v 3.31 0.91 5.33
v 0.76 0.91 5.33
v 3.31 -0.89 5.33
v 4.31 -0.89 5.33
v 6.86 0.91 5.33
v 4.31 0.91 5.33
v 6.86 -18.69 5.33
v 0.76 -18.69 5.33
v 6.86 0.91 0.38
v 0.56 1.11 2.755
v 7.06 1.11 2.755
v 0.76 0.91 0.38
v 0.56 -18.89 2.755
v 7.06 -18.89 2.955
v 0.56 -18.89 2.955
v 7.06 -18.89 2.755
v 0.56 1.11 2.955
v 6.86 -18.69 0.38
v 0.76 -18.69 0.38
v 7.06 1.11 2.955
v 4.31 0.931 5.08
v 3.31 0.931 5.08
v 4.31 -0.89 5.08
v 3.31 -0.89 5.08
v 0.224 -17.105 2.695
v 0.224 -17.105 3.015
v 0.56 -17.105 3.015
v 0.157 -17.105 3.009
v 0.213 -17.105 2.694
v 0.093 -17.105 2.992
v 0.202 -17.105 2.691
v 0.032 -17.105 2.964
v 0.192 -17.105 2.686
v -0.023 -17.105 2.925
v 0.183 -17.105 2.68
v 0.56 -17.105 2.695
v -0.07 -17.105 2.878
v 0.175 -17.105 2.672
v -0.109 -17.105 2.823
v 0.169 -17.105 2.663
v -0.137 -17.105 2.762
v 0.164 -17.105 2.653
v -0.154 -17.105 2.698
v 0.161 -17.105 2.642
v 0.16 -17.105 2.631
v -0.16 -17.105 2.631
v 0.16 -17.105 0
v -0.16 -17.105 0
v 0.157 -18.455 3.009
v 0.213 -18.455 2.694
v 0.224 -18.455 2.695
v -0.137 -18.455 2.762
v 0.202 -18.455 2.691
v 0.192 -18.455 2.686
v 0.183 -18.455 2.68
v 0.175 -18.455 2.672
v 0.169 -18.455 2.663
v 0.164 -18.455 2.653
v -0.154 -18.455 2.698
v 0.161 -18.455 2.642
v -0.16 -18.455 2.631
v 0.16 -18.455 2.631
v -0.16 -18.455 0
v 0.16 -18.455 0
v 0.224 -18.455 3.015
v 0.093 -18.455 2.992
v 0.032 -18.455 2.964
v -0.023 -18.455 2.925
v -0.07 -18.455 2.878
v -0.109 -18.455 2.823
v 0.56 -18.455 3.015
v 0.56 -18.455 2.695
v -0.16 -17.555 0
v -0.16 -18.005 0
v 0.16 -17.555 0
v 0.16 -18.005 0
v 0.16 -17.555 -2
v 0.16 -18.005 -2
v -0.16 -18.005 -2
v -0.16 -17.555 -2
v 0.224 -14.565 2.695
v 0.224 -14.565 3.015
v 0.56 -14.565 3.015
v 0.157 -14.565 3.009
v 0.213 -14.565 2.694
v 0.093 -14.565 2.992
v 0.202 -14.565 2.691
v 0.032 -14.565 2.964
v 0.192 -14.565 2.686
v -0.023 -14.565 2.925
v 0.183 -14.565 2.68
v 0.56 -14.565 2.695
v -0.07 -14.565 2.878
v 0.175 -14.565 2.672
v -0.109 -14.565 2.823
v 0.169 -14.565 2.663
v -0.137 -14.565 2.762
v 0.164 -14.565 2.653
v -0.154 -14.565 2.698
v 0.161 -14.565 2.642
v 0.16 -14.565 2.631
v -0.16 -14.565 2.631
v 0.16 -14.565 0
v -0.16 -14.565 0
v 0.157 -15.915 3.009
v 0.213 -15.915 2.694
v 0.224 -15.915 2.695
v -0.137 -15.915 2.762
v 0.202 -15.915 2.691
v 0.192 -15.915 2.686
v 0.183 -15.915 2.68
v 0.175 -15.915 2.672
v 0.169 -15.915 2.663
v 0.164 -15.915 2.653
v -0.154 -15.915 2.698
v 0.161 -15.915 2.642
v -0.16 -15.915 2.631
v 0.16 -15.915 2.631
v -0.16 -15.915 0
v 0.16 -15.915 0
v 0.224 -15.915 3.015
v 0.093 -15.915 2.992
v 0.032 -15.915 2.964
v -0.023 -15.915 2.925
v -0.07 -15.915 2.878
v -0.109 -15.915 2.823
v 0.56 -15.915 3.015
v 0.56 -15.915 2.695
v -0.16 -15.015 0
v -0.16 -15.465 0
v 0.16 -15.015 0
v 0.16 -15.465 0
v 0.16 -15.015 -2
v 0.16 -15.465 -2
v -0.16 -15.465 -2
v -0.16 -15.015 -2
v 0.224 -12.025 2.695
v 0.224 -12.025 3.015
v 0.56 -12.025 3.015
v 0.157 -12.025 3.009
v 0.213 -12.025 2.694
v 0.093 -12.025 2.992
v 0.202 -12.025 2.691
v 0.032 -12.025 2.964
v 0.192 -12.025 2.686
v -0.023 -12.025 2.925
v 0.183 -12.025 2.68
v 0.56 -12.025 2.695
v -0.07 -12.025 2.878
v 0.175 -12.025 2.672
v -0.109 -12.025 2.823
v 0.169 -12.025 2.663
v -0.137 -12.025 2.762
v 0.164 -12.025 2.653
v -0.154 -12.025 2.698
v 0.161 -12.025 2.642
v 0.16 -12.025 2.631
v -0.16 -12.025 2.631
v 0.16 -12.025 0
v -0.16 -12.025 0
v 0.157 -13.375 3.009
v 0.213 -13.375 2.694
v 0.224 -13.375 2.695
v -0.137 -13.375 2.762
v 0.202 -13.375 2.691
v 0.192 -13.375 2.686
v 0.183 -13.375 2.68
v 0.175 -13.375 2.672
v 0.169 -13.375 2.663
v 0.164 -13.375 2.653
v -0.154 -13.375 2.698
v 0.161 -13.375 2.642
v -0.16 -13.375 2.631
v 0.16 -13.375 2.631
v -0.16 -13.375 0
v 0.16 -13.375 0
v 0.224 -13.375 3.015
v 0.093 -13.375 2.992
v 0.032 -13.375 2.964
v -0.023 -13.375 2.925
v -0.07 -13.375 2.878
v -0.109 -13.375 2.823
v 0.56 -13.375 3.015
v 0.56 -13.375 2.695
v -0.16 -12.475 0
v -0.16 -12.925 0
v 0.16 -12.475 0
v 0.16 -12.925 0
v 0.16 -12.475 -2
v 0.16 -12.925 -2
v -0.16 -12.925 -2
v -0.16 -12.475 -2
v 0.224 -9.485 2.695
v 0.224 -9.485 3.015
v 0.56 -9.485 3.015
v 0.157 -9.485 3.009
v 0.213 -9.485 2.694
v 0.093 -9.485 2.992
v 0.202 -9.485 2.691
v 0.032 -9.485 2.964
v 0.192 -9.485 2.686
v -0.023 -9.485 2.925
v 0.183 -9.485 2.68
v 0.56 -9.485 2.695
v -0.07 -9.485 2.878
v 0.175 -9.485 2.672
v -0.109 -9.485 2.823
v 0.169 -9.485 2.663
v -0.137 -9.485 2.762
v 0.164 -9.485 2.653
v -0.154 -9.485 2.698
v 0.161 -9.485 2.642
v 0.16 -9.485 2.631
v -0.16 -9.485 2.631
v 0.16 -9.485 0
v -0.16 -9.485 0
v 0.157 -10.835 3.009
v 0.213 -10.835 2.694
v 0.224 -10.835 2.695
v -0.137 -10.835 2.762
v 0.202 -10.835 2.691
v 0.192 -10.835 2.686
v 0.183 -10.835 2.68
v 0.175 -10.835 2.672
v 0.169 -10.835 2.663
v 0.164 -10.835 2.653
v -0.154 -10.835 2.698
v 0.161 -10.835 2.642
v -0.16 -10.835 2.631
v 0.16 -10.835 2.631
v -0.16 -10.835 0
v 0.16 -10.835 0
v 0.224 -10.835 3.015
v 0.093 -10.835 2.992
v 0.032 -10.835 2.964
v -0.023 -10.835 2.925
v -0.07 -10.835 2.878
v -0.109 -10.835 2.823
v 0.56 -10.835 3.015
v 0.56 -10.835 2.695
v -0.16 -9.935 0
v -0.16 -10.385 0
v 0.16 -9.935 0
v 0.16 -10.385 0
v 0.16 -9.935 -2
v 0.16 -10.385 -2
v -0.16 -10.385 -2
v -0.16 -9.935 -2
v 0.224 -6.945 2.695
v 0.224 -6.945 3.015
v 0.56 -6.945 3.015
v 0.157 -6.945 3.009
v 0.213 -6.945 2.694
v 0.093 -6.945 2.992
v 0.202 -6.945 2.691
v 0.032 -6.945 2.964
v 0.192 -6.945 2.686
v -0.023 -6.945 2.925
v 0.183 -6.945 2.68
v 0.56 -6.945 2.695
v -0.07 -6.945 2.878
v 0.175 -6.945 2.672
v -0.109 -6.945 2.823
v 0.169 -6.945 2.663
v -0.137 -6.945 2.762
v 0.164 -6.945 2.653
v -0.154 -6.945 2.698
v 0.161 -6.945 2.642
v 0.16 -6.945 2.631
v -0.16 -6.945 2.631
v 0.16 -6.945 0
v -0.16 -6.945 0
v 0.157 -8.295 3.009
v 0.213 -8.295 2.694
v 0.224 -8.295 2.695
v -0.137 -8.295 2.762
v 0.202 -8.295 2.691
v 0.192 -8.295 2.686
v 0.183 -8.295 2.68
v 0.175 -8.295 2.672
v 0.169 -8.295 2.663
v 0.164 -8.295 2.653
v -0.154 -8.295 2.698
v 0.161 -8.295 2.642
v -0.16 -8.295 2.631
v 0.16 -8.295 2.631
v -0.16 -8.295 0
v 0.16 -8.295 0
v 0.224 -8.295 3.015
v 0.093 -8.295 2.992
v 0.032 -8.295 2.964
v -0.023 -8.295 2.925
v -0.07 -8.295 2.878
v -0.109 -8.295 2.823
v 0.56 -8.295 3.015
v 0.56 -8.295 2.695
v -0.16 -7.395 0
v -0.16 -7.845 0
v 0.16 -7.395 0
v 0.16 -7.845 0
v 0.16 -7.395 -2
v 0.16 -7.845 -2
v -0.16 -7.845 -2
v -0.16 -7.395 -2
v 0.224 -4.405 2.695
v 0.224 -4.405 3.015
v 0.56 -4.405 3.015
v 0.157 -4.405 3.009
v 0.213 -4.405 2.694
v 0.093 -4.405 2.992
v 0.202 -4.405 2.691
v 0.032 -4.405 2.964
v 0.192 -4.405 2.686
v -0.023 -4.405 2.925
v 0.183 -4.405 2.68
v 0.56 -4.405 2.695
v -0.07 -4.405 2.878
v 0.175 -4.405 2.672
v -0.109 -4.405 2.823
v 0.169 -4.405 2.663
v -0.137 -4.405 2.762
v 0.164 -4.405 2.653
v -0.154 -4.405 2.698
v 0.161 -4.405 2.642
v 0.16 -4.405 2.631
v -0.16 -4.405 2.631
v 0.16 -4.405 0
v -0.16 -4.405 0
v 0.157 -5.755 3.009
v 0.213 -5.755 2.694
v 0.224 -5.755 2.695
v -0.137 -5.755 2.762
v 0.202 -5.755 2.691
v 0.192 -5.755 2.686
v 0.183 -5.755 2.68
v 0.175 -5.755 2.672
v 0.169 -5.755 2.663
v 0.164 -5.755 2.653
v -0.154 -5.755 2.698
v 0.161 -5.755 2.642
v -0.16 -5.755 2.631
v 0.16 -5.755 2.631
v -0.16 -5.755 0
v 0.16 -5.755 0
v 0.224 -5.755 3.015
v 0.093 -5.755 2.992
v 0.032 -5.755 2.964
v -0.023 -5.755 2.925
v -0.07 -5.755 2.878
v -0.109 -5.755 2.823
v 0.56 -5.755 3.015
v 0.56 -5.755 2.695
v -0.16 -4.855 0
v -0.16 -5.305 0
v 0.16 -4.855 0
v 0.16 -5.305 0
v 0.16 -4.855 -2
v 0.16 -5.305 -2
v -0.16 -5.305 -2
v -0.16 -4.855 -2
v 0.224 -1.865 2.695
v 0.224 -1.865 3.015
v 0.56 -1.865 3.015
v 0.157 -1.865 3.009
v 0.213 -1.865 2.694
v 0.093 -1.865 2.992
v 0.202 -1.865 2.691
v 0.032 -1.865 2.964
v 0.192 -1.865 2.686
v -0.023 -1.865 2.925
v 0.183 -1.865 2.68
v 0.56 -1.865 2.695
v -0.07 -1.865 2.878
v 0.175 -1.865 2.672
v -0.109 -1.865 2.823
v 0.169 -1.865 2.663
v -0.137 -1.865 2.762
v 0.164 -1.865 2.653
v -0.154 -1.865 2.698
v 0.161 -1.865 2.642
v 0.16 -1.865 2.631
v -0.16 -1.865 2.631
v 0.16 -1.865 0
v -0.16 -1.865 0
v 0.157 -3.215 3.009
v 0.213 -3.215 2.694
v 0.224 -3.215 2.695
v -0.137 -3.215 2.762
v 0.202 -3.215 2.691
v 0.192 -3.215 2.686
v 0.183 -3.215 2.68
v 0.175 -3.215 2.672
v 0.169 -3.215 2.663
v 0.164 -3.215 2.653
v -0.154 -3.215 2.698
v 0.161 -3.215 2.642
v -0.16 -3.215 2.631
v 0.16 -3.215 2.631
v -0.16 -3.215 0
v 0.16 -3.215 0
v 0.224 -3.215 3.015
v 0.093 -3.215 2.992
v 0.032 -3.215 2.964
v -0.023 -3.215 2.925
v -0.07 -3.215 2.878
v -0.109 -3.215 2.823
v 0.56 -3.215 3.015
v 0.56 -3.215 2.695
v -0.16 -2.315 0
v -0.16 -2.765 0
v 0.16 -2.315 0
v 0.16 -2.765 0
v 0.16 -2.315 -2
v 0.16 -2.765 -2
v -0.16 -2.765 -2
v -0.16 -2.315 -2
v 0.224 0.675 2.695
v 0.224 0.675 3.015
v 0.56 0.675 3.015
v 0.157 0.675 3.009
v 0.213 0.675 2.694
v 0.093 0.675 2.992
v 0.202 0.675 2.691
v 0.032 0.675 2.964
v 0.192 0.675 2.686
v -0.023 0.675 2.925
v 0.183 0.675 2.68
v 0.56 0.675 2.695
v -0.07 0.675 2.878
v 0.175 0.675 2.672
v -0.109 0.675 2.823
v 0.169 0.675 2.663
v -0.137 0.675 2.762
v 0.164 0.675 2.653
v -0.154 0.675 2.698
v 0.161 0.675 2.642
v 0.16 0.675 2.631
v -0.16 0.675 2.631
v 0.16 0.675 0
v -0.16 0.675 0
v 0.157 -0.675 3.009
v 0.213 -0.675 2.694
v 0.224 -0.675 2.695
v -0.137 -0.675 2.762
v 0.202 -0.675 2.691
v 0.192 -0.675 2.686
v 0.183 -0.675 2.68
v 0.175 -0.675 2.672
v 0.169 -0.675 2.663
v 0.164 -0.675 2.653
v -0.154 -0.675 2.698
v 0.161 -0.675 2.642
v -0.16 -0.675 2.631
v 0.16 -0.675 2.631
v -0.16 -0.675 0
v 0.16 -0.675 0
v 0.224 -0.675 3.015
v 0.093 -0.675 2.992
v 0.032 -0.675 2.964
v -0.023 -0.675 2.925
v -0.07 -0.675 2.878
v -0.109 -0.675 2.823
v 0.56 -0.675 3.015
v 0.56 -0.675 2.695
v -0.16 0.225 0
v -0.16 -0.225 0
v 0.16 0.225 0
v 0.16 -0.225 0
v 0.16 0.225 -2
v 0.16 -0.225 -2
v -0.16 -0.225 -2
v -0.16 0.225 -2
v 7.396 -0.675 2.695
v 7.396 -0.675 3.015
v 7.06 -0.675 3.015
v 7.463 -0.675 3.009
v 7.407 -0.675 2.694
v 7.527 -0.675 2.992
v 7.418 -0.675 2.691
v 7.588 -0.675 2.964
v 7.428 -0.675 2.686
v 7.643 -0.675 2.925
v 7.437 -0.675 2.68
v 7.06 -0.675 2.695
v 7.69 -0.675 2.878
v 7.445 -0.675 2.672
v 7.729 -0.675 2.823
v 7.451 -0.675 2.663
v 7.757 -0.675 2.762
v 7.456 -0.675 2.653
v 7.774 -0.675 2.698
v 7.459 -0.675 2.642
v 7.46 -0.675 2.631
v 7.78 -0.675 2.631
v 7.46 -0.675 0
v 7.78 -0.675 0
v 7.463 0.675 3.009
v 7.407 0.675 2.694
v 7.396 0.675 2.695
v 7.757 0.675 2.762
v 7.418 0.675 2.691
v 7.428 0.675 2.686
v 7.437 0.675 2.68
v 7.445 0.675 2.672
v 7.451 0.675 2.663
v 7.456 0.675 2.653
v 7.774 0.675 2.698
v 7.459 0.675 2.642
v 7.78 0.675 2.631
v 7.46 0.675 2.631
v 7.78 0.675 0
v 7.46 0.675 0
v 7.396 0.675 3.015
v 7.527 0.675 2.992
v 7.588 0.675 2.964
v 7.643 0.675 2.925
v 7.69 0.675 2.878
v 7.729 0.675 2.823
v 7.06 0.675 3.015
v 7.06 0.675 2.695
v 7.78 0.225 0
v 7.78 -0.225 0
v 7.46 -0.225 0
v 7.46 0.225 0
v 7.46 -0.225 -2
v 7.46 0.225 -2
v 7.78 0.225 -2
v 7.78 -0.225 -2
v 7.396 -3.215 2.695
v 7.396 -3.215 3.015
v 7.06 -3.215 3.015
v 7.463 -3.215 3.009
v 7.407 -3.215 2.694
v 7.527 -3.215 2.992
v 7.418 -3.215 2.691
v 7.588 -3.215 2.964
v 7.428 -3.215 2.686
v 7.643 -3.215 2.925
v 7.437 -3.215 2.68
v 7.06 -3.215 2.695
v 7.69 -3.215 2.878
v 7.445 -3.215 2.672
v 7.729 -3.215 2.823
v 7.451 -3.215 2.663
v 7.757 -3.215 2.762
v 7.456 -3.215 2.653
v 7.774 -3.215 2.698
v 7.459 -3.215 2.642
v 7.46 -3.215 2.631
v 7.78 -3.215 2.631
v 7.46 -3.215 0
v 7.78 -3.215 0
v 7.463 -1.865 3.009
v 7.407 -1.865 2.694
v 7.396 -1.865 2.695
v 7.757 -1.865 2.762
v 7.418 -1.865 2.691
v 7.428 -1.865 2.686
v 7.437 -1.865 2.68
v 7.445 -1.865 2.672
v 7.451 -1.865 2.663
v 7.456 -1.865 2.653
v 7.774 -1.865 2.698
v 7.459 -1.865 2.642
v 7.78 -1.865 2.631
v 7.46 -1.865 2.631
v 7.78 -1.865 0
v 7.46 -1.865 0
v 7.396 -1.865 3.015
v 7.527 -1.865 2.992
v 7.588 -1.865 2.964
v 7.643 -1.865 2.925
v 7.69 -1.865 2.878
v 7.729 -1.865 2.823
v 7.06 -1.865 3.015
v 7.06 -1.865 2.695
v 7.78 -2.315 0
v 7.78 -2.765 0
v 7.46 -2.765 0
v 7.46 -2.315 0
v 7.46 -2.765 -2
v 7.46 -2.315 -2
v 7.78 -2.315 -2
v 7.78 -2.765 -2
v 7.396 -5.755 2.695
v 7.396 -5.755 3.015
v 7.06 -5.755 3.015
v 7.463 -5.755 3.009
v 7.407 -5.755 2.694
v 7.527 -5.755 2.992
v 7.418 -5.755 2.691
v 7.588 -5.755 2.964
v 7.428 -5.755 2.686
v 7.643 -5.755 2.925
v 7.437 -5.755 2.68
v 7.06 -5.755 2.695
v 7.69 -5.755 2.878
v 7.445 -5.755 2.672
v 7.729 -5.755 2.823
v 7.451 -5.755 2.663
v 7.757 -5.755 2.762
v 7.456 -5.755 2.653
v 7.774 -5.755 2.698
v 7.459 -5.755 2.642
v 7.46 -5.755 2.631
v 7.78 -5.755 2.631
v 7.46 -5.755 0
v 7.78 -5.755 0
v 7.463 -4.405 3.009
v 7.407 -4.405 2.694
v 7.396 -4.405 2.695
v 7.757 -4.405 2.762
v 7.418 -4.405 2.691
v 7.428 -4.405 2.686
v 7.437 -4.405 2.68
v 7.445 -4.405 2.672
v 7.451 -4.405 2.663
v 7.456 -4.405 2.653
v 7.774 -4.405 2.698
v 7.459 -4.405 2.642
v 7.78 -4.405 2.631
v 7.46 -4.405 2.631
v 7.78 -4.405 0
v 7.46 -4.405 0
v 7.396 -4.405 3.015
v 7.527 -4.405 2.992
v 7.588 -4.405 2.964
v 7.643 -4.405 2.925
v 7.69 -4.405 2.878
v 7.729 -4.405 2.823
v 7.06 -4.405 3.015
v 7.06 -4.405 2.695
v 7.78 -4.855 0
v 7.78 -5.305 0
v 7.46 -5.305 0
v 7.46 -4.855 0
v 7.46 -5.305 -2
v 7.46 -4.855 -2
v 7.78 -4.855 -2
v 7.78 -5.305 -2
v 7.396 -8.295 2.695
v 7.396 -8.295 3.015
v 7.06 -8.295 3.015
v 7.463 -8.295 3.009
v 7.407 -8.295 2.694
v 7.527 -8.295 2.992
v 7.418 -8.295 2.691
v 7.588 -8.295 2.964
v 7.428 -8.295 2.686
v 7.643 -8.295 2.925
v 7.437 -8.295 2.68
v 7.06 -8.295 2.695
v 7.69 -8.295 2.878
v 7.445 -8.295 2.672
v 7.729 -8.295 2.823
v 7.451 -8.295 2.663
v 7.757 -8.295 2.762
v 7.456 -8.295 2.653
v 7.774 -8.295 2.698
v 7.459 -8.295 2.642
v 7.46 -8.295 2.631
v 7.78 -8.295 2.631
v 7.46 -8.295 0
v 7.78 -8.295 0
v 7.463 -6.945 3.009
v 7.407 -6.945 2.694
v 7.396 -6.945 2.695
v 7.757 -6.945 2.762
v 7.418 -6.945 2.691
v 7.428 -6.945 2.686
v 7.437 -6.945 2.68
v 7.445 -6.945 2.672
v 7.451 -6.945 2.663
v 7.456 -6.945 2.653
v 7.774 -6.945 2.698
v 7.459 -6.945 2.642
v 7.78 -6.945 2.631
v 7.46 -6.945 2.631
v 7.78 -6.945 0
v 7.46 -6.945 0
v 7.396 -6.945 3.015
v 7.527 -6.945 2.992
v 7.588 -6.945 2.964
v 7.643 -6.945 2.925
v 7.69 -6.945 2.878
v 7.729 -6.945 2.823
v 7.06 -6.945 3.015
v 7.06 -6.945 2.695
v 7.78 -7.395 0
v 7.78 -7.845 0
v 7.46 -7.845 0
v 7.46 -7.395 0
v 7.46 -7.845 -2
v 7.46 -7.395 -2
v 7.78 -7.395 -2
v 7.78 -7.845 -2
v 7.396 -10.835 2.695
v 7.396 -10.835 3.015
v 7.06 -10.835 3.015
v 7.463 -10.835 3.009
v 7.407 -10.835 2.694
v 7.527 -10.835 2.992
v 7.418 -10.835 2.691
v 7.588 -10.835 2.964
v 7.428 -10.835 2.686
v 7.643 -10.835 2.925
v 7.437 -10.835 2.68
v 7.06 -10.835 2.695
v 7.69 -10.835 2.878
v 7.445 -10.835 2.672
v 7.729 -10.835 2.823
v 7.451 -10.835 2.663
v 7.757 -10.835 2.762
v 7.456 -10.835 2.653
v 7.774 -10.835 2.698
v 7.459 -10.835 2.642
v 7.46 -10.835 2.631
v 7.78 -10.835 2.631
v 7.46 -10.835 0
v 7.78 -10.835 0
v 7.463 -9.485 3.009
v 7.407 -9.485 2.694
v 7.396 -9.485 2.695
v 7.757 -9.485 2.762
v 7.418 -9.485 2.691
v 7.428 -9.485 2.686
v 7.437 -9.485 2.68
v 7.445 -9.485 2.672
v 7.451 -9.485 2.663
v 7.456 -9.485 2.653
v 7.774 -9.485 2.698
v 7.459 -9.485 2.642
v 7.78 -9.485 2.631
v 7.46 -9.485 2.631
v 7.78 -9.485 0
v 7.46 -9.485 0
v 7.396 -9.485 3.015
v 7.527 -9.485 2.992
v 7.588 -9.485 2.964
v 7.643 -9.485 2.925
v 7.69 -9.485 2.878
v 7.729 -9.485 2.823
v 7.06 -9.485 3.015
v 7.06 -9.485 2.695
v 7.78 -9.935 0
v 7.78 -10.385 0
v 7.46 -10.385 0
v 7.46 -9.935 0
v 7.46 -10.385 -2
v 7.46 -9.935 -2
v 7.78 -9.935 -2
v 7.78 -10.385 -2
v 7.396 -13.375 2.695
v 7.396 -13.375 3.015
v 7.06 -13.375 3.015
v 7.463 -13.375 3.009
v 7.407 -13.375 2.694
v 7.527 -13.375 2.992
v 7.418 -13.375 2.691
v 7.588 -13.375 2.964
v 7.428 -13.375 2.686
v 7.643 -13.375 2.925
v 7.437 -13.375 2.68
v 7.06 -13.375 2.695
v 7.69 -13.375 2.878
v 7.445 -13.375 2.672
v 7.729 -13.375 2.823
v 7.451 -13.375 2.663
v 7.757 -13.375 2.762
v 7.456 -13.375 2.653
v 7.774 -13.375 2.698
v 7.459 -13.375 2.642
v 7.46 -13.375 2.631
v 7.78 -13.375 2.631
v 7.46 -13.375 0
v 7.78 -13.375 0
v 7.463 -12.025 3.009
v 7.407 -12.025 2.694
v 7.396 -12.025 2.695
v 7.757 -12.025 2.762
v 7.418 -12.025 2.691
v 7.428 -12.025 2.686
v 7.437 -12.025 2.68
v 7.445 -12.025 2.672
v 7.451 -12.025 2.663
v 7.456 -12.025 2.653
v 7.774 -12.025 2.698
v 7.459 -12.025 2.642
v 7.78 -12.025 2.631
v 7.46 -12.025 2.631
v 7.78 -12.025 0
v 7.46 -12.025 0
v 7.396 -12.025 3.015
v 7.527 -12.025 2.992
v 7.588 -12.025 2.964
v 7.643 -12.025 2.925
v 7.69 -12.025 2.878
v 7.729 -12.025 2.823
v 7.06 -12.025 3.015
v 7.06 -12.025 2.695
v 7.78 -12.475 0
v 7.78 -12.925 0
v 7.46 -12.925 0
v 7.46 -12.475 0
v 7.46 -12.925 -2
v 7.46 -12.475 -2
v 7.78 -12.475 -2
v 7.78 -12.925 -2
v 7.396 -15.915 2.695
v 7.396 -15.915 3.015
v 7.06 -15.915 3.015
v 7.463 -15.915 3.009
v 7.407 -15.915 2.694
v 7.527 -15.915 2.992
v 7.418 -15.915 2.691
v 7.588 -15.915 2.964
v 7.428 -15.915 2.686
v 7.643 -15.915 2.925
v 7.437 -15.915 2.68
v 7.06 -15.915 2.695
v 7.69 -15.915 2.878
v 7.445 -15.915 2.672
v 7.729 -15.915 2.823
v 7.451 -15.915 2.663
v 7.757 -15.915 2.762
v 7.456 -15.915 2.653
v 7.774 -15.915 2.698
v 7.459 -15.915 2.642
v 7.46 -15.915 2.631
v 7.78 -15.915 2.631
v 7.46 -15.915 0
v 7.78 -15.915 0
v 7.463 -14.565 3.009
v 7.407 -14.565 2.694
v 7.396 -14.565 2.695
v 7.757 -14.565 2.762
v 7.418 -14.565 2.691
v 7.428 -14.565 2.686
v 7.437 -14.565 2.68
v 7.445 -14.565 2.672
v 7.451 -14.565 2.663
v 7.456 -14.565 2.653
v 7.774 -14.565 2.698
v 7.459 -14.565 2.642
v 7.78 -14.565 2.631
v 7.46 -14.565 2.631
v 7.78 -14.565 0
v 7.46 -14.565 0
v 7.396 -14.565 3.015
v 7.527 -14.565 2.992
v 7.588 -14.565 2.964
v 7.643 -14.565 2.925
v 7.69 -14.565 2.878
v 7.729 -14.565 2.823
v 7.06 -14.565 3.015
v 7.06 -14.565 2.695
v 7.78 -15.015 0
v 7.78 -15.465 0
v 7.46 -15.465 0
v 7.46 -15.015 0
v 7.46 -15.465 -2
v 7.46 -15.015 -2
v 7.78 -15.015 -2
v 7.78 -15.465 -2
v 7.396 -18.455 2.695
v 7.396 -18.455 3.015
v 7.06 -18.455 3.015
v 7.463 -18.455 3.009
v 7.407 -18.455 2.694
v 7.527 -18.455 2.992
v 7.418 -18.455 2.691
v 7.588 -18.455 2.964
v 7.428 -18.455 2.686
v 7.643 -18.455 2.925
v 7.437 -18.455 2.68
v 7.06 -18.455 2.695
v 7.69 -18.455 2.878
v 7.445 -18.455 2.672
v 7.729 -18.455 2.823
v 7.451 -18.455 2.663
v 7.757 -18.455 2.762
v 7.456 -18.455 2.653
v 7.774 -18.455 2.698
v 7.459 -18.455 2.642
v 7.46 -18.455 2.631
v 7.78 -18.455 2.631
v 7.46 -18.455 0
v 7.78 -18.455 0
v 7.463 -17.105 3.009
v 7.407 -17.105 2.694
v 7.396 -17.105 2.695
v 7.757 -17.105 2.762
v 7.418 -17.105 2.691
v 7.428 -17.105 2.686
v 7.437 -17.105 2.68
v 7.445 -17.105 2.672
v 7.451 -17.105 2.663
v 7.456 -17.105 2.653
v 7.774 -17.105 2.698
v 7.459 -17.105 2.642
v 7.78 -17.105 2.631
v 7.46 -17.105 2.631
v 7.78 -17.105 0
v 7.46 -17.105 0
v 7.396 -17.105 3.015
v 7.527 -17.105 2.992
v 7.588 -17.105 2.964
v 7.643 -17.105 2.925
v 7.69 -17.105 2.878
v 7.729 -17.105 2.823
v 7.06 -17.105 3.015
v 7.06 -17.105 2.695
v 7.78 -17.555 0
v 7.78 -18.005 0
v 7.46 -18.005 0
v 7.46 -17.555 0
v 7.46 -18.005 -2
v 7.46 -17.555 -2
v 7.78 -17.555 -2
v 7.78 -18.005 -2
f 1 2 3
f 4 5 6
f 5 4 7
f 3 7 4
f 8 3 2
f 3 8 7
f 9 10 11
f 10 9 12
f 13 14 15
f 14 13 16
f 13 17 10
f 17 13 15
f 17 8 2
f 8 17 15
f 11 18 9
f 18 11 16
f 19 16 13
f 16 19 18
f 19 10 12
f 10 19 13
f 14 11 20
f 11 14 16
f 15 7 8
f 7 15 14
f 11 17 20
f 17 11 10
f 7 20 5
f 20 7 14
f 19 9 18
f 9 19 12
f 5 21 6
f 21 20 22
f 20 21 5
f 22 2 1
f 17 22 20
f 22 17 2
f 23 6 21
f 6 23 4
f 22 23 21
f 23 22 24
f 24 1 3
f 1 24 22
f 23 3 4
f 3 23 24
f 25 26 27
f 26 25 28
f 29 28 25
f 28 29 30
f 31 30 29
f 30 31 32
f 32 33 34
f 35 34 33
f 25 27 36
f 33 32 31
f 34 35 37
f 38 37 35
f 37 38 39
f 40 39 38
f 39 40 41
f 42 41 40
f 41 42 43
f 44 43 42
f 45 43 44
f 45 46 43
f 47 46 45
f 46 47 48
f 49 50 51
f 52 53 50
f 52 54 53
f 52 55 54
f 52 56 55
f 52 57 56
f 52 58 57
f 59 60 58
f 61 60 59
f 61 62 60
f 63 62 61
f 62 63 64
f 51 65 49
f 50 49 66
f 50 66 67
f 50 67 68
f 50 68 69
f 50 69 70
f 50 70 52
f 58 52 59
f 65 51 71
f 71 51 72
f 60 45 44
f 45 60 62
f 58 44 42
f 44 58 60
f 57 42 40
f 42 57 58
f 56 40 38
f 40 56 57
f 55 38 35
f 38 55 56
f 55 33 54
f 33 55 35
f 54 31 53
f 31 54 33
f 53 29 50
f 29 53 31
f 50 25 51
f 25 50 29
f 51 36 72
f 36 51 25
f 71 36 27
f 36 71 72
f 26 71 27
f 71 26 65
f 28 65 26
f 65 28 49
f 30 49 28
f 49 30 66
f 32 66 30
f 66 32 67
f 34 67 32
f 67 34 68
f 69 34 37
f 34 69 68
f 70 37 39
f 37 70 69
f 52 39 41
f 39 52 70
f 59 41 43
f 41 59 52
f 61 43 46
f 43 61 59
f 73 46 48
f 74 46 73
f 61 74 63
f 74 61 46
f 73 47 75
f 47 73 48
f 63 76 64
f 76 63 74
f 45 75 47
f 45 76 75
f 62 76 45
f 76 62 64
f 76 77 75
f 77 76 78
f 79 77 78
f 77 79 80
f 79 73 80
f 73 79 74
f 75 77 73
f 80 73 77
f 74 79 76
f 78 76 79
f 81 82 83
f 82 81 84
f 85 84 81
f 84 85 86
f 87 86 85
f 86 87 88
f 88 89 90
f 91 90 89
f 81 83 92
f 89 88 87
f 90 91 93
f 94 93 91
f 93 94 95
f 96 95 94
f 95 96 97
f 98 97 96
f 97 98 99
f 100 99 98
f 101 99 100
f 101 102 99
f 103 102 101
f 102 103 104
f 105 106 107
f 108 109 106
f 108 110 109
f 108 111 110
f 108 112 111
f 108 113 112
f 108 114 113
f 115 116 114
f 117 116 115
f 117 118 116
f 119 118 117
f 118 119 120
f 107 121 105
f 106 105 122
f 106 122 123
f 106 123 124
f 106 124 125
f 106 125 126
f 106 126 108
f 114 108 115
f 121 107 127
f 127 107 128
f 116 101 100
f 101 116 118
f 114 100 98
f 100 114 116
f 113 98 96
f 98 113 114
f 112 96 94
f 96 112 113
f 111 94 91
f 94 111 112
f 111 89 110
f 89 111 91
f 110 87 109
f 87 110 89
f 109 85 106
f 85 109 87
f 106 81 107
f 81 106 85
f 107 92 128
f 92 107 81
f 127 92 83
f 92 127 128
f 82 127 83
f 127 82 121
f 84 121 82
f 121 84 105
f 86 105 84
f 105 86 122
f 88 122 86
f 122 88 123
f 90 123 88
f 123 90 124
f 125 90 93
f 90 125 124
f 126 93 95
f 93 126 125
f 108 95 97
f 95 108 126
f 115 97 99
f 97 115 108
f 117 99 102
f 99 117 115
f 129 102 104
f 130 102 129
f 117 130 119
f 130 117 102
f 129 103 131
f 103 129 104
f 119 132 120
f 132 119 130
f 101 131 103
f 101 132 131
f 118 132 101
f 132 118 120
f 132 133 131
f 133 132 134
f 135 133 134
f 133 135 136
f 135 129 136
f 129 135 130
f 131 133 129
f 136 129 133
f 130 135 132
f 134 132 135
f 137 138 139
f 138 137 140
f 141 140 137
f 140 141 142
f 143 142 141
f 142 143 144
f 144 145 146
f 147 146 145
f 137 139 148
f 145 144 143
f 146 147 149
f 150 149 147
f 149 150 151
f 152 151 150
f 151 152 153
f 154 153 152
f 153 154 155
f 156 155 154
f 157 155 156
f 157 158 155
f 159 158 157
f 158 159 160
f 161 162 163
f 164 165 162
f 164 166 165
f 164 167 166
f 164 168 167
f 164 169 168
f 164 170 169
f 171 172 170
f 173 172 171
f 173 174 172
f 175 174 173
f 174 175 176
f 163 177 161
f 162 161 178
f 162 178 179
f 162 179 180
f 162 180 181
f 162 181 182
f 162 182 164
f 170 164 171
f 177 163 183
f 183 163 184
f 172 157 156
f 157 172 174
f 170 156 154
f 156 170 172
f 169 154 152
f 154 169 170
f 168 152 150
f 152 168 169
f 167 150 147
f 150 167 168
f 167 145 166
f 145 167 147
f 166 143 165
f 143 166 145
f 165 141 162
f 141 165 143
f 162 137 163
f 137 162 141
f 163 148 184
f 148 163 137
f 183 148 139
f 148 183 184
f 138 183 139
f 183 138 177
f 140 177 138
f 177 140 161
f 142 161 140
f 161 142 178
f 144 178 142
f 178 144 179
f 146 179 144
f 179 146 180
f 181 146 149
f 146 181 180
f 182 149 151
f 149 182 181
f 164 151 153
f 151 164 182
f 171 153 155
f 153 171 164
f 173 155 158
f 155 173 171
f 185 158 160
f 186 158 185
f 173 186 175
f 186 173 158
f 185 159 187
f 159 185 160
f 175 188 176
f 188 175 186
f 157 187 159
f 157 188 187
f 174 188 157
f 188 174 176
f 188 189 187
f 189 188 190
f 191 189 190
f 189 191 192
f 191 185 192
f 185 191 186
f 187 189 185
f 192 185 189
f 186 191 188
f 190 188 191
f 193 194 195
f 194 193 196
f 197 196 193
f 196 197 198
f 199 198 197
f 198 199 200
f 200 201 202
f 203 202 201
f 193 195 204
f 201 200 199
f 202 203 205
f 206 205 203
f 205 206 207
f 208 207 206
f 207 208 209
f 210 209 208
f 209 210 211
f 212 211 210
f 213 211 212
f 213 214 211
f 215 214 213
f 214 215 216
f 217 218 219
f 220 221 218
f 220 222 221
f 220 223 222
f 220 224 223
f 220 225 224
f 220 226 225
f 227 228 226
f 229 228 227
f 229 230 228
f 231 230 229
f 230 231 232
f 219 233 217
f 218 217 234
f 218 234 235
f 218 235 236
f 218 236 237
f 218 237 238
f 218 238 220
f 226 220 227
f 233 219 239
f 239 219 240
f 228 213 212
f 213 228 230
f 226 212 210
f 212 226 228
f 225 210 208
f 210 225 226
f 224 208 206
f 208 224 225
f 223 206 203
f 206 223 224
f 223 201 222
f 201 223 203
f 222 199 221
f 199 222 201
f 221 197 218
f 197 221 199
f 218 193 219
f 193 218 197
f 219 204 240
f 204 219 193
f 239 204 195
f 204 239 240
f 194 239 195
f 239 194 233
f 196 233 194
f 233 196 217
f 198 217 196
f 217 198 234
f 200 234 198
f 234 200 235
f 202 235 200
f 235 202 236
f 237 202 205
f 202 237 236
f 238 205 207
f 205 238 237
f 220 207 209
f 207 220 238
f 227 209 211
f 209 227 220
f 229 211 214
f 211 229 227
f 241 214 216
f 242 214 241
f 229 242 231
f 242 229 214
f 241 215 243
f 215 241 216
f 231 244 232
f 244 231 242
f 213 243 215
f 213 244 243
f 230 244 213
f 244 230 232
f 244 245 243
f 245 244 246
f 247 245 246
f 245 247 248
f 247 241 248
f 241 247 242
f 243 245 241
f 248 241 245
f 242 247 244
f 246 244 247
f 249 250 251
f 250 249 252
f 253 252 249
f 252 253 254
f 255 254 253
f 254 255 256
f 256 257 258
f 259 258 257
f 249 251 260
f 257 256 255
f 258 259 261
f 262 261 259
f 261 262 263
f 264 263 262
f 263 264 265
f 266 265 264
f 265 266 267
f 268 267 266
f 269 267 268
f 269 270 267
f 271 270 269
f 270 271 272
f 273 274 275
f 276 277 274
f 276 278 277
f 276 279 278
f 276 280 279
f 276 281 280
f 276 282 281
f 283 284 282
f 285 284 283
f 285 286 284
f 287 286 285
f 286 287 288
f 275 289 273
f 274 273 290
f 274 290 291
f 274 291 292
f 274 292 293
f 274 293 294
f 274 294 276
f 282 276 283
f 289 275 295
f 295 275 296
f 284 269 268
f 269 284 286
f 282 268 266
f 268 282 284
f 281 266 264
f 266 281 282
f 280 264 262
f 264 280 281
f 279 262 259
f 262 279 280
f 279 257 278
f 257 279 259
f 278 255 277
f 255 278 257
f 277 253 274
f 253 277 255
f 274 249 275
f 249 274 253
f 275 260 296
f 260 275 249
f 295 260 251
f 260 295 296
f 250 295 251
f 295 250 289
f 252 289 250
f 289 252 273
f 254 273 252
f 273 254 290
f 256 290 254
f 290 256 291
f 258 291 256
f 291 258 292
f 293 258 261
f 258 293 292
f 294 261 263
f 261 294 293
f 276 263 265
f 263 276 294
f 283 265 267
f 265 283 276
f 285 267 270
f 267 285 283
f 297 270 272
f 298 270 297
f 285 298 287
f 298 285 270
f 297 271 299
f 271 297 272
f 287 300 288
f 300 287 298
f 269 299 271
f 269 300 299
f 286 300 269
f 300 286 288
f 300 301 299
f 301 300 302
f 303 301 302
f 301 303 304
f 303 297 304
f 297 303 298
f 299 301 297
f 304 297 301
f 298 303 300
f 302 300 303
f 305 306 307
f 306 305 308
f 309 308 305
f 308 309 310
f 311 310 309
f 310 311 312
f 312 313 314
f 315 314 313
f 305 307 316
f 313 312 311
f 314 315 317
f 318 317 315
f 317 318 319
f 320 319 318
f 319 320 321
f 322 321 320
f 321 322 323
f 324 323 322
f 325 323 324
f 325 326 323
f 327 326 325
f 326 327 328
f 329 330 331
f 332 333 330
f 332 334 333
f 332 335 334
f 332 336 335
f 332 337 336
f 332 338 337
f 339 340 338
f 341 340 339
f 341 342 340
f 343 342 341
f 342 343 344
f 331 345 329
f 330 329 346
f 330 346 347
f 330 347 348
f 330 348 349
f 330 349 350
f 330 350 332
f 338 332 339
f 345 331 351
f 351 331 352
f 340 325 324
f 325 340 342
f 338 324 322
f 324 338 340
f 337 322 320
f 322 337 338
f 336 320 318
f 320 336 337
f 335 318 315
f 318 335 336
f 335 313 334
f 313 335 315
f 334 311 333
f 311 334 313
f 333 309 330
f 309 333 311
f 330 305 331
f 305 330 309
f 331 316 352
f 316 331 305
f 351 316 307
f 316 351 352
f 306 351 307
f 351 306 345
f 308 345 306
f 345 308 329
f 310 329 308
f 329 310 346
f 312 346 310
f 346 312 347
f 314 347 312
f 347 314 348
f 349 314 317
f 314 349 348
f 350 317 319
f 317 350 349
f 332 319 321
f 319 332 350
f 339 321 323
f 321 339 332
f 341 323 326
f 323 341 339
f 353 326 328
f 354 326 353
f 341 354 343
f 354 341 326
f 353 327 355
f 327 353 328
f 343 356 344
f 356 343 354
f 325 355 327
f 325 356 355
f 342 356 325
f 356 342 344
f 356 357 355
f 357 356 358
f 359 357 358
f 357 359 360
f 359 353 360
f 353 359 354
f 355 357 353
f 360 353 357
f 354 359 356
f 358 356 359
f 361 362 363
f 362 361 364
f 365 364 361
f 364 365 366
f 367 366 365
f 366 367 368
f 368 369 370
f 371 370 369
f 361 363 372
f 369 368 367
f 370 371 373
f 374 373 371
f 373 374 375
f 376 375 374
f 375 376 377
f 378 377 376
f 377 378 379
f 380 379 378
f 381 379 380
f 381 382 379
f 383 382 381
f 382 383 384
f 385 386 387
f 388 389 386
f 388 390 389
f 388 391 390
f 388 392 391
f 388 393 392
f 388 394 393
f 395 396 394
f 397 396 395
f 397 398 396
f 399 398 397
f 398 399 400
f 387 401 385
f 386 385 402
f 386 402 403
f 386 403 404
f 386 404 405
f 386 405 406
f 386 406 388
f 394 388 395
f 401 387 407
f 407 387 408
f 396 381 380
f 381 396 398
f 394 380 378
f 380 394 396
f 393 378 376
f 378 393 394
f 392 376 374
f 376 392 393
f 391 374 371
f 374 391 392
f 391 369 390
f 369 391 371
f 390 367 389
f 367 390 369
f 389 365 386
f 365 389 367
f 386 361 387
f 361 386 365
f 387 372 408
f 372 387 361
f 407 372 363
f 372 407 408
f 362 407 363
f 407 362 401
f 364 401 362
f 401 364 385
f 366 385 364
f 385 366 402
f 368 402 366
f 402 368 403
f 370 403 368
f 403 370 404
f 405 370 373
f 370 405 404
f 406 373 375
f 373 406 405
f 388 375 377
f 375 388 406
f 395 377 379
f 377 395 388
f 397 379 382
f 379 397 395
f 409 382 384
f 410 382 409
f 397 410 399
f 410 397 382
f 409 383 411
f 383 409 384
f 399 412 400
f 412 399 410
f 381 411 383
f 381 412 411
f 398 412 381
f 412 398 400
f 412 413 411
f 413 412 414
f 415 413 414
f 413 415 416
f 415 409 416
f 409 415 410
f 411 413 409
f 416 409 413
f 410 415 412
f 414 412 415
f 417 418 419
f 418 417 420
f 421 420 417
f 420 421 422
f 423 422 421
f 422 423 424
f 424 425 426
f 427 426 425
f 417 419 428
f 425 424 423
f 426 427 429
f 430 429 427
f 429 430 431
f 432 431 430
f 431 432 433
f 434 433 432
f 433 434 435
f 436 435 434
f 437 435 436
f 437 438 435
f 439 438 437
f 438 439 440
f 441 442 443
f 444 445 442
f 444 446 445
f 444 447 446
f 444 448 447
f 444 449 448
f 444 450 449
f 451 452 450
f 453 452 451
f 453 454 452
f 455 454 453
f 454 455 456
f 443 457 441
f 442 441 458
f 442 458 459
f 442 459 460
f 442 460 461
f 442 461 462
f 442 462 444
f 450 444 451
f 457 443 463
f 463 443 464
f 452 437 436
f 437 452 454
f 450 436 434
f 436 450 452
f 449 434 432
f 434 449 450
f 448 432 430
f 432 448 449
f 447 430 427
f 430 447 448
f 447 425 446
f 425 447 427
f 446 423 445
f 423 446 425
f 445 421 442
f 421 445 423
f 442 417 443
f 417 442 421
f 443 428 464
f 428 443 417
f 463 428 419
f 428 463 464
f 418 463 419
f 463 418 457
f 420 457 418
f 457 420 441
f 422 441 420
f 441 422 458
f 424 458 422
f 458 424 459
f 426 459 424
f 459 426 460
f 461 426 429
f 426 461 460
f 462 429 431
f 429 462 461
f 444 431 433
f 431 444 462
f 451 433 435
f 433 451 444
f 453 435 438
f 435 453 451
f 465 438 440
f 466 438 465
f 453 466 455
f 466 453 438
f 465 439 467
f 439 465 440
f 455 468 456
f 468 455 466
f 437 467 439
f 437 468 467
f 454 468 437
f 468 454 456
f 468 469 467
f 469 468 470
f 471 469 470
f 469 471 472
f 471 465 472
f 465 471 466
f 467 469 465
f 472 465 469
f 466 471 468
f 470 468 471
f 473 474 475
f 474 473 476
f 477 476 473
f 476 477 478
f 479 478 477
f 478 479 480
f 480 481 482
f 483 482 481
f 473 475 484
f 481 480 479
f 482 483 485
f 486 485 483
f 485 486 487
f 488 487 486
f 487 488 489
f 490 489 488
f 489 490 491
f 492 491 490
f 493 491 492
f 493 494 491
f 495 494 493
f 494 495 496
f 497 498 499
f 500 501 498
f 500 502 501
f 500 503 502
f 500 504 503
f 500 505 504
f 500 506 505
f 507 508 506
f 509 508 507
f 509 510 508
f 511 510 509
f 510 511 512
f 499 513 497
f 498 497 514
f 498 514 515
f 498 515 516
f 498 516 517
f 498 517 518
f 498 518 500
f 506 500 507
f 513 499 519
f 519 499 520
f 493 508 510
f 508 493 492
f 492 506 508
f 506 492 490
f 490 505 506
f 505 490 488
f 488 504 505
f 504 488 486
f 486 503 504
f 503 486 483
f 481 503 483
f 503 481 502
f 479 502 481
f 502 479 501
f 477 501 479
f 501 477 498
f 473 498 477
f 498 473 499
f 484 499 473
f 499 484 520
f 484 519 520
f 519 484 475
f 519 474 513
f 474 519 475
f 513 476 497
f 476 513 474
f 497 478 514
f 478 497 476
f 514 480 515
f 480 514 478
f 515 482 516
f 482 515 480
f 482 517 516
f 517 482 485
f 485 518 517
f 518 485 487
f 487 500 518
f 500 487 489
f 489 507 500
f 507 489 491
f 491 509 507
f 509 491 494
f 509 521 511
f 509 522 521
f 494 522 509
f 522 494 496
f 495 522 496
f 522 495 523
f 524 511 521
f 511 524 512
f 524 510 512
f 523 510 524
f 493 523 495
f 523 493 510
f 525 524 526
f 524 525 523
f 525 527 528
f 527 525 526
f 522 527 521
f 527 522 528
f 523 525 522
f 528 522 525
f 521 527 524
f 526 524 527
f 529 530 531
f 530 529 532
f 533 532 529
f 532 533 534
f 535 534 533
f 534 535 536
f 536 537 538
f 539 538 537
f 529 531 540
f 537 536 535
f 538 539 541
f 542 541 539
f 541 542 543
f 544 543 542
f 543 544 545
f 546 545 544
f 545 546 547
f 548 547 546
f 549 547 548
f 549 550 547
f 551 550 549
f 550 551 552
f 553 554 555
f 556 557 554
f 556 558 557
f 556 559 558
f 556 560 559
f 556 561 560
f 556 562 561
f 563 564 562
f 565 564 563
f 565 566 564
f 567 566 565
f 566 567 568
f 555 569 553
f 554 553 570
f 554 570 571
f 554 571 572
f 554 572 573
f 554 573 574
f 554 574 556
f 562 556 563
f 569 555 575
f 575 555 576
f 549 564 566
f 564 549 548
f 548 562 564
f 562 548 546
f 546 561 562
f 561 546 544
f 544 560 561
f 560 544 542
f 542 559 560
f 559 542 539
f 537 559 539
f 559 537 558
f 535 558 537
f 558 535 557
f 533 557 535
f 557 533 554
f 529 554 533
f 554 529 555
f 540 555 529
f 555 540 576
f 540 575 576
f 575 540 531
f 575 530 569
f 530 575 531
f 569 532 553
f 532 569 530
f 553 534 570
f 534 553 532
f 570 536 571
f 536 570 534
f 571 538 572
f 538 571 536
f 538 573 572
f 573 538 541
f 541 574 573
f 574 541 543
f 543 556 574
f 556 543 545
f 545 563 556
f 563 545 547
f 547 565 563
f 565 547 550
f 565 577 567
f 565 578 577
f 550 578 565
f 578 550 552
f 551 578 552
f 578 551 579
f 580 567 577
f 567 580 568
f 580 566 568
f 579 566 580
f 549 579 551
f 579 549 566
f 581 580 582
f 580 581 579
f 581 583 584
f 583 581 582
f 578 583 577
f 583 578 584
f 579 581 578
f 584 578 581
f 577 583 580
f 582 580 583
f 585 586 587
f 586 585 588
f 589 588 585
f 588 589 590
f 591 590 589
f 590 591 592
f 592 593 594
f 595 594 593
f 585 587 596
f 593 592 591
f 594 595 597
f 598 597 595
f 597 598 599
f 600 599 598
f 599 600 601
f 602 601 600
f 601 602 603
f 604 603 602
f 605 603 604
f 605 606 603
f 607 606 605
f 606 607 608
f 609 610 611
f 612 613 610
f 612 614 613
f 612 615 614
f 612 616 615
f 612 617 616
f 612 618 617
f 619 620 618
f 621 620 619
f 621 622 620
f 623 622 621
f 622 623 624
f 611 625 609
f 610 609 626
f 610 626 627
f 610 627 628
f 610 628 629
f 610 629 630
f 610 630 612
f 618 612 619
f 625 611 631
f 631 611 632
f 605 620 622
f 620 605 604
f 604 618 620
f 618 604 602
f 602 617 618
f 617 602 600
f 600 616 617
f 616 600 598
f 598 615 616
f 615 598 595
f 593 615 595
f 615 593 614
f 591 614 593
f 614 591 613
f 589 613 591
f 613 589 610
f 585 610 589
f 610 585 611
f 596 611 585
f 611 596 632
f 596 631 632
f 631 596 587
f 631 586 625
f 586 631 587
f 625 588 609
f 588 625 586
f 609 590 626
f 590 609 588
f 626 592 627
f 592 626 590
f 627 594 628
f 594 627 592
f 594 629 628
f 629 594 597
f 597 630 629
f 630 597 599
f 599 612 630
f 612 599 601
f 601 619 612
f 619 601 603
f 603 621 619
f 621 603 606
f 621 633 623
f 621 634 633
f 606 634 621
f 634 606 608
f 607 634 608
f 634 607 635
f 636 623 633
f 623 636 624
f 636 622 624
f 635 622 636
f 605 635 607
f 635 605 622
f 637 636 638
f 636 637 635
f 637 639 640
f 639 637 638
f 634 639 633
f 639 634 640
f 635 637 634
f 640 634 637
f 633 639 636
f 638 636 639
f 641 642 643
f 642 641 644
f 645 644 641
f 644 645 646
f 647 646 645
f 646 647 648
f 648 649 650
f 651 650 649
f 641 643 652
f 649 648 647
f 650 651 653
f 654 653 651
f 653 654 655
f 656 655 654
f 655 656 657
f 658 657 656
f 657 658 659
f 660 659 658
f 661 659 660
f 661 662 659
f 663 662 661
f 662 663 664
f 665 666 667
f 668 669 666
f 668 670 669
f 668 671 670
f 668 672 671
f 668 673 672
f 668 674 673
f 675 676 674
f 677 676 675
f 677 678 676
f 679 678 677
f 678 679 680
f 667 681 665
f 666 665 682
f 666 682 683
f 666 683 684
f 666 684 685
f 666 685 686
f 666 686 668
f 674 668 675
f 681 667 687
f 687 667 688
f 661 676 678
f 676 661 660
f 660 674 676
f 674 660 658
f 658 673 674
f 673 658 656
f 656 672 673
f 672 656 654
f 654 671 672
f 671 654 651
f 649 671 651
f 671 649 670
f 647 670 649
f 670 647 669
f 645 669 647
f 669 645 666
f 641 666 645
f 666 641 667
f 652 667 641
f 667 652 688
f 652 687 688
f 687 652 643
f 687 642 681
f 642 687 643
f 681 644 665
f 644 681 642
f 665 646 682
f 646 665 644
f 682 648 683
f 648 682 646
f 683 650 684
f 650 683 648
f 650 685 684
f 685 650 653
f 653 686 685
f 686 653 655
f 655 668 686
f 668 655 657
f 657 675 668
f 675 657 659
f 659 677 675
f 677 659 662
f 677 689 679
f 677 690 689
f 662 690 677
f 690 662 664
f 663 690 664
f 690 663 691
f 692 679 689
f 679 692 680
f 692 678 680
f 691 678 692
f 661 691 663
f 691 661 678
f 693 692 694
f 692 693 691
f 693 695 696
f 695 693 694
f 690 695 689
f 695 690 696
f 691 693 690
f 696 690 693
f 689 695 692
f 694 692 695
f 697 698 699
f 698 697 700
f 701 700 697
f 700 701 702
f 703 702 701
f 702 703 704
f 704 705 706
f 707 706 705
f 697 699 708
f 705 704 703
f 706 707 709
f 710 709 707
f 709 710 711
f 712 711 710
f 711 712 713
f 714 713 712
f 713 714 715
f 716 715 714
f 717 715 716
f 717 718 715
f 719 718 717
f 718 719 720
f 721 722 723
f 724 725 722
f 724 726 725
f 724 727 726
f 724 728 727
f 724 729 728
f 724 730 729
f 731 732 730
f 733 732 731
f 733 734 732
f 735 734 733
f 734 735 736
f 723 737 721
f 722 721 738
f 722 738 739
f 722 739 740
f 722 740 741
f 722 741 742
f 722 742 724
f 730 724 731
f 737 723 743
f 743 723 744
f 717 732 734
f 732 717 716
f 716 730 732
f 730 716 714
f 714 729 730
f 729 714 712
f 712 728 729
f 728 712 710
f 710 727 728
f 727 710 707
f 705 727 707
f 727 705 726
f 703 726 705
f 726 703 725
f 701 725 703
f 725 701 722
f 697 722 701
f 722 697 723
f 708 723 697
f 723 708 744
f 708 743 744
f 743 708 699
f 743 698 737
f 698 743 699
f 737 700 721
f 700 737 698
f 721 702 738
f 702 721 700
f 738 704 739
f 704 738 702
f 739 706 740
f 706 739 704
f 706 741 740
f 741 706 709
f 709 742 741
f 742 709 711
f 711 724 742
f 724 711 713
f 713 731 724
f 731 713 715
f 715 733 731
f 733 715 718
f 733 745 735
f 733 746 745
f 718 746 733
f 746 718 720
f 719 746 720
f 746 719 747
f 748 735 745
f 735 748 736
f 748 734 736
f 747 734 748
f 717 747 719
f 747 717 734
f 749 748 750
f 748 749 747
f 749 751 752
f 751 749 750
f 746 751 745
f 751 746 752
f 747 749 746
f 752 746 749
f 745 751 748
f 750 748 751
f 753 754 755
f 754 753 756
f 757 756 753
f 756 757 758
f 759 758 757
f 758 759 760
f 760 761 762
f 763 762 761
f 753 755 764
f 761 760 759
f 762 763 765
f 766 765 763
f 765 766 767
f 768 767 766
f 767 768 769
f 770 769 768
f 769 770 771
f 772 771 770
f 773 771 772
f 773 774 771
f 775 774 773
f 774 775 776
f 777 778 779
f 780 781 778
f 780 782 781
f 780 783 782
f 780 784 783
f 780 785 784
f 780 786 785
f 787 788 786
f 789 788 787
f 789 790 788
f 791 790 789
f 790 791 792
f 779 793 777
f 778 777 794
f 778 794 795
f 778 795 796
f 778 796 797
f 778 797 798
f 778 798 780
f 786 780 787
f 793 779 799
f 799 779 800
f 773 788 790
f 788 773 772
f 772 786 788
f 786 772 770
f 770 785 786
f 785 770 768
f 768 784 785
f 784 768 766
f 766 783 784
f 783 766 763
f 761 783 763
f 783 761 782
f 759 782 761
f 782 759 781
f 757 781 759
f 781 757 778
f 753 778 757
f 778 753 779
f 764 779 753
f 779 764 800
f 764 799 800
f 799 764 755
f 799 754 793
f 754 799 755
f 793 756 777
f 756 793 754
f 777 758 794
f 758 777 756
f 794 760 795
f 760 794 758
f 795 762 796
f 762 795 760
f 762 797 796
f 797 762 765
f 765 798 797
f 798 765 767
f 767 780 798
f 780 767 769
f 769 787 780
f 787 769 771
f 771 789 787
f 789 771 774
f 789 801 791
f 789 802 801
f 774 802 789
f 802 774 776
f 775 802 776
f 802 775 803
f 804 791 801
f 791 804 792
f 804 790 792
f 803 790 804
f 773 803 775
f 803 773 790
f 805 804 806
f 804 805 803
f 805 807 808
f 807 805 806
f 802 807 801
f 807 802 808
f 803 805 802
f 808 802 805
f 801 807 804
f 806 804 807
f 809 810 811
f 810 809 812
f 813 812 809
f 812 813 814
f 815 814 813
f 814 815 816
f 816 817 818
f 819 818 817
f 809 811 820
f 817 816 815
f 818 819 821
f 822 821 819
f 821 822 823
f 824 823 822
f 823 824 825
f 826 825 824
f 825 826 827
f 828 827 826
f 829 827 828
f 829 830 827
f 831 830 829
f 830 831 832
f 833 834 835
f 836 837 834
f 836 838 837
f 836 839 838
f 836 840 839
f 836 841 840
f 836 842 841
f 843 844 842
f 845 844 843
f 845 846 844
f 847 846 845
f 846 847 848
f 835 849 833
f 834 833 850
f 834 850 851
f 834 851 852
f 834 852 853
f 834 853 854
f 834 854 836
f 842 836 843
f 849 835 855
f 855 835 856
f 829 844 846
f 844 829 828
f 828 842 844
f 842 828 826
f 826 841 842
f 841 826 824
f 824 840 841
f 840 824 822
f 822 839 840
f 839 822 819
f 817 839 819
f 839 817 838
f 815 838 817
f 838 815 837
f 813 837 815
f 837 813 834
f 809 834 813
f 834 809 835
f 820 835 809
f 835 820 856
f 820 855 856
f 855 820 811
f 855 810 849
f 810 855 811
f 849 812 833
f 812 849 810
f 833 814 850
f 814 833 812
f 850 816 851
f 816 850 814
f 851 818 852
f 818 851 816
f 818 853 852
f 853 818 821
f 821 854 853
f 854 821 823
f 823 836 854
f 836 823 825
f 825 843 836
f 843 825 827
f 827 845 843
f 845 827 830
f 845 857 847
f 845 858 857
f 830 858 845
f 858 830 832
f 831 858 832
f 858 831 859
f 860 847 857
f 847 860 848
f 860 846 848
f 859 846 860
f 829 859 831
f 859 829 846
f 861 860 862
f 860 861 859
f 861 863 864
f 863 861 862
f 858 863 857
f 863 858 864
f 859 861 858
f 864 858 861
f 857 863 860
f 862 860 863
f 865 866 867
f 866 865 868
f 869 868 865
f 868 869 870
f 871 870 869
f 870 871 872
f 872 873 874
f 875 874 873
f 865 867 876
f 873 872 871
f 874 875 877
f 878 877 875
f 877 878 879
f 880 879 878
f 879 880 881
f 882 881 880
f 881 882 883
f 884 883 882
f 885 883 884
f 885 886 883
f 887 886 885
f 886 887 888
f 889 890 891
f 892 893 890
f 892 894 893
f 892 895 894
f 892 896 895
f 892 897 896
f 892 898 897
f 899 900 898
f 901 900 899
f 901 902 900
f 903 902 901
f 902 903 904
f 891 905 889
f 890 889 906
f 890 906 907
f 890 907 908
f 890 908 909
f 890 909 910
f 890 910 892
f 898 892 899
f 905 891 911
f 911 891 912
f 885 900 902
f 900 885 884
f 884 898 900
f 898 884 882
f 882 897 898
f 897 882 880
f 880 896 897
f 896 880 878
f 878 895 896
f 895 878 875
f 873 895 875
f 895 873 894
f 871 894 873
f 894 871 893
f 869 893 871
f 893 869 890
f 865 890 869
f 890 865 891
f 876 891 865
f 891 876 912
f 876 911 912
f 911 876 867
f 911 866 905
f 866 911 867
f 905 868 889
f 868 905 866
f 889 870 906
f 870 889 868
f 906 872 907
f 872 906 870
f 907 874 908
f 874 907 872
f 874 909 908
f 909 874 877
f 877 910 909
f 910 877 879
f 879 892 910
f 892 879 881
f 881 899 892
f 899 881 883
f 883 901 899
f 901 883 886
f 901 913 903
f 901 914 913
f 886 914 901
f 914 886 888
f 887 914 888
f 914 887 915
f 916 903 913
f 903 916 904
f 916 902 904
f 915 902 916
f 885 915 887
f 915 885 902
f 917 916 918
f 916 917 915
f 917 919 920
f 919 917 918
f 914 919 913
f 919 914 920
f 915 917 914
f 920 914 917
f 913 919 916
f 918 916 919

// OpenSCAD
// file: proto/dip.scad
/*
OpenSCAD Model:  DIP package

Parameters:
  N  - Number of pins
  P  - Pitch
  TC - Width
  W  - Width of pin
  T  - Thickness of pin
  A  - Body length
  B  - Body width
  H  - Body height
  K  - Elevation
  h  - Pin length
  pincolor - color of pin
  bodycolor - color of plastic body
  simple - 0 = realistic model, 1 = simplified model
*/

module dip(
	N=14,
	P=2.54,
	TC=7.62,
	W=0.45,
	H=5.33,
	T=0.375,
	A=6.35,
	B=19.2,
	K=0.38,
	h=2.0,
	pincolor=[0.9,0.9,0.9],
	bodycolor=[0.2,0.2,0.2],
	simple=0
) {

	module dippinblock()	{
		q=[0,0.173648178,0.342020143,0.5,0.64278761,0.766044443,0.866025404,0.939692621,0.984807753,1];

		x=0.01;
		t2=T/2;
		hk=(H-K)/2+K;
		dt=1.2*T;
		dt2=dt-T;
		cx=dt-t2;
		cy= hk+t2-dt;
		color(pincolor) for (i=[0:(N/2)-1]) {
			 union () {
					translate ([0,-((N/2)-1)/2*P+i*P+1.5*W,0]) rotate(90,[1,0,0]) linear_extrude(height=3*W) {
					if (simple) {
						polygon([
							[-t2,0], [-t2, hk+t2-dt], 	[dt-t2,hk+t2], [(TC-A)/2,hk+t2],[(TC-A)/2,hk-t2], [dt-t2,hk-t2], [t2,hk+t2-dt], [t2,0]]
						);
					} else {
						 polygon([
							[-t2,0],
							[cx-dt*q[9],dt*q[0]+cy],[cx-dt*q[8],dt*q[1]+cy],[cx-dt*q[7],dt*q[2]+cy],[cx-dt*q[6],dt*q[3]+cy],[cx-dt*q[5],dt*q[4]+cy],
							[cx-dt*q[4],dt*q[5]+cy],[cx-dt*q[3],dt*q[6]+cy],[cx-dt*q[2],dt*q[7]+cy],[cx-dt*q[1],dt*q[8]+cy],[cx-dt*q[0],dt*q[9]+cy],
							[dt-t2,hk+t2],
							[(TC-A)/2,hk+t2],[(TC-A)/2,hk-t2],
							[cx-dt2*q[0],dt2*q[9]+cy],[cx-dt2*q[1],dt2*q[8]+cy],[cx-dt2*q[2],dt2*q[7]+cy],[cx-dt2*q[3],dt2*q[6]+cy],[cx-dt2*q[4],dt2*q[5]+cy],
							[cx-dt2*q[5],dt2*q[4]+cy],[cx-dt2*q[6],dt2*q[3]+cy],[cx-dt2*q[7],dt2*q[2]+cy],[cx-dt2*q[8],dt2*q[1]+cy],[cx-dt2*q[9],dt2*q[0]+cy],
							[t2,0]]
						);
					}
					}
				translate ([0,-((N/2)-1)/2*P+i*P,-1]) cube([T,W,2],center=true);
			}
		}
	}
	color(bodycolor) {
		translate([0,0,(H-K)/2+K]) {
			difference() {
			if (simple) {
				cube([A,B,H-K],center=true);
			} else {
				polyhedron(
					[[-A/2+0.2,B/2-0.2,(H-K)/2],[A/2-0.2,B/2-0.2,(H-K)/2],[A/2-0.2,-B/2+0.2,(H-K)/2],[-A/2+0.2,-B/2+0.2,(H-K)/2],
					 [-A/2,B/2,0.1],[A/2,B/2,0.1],[A/2,-B/2,0.1],[-A/2,-B/2,0.1],
					 [-A/2,B/2,-0.1],[A/2,B/2,-0.1],[A/2,-B/2,-0.1],[-A/2,-B/2,-0.1],
					 [-A/2+0.2,B/2-0.2,-(H-K)/2],[A/2-0.2,B/2-0.2,-(H-K)/2],[A/2-0.2,-B/2+0.2,-(H-K)/2],[-A/2+0.2,-B/2+0.2,-(H-K)/2]],
					[
					[0,1,2],[2,3,0],[14,13,12],[12,15,14],
					[0,4,5],[5,1,0],[1,5,6],[6,2,1],[2,6,7],[7,3,2],[3,7,4],[4,0,3],
					[4,8,9],[9,5,4],[5,9,10],[10,6,5],[6,10,11],[11,7,6],[11,8,4],[4,7,11],
					[8,12,13],[13,9,8],[9,13,14],[14,10,9],[10,14,15],[15,11,10],[11,15,12],[12,8,11],
					]
				);
			}
			translate([0,B/2-1,(H-K)/2]) cube([1,2,0.5],center=true);
			}
		}
	}

	translate([-TC/2,0,0]) dippinblock();
	translate([TC/2,0,0]) rotate(180,[0,0,1]) dippinblock();
}
// main file
/*

DIP 16, 0.300mil

*/

include <proto/dip.scad>

translate ([3.81,-8.89,0]) dip(
	N=16,
	P=2.54,
	TC=7.62,
	W=0.45,
	T=0.32,
	A=6.5,
	B=20,
	H=5.33,
	K=0.38,
	h=3.55
);
